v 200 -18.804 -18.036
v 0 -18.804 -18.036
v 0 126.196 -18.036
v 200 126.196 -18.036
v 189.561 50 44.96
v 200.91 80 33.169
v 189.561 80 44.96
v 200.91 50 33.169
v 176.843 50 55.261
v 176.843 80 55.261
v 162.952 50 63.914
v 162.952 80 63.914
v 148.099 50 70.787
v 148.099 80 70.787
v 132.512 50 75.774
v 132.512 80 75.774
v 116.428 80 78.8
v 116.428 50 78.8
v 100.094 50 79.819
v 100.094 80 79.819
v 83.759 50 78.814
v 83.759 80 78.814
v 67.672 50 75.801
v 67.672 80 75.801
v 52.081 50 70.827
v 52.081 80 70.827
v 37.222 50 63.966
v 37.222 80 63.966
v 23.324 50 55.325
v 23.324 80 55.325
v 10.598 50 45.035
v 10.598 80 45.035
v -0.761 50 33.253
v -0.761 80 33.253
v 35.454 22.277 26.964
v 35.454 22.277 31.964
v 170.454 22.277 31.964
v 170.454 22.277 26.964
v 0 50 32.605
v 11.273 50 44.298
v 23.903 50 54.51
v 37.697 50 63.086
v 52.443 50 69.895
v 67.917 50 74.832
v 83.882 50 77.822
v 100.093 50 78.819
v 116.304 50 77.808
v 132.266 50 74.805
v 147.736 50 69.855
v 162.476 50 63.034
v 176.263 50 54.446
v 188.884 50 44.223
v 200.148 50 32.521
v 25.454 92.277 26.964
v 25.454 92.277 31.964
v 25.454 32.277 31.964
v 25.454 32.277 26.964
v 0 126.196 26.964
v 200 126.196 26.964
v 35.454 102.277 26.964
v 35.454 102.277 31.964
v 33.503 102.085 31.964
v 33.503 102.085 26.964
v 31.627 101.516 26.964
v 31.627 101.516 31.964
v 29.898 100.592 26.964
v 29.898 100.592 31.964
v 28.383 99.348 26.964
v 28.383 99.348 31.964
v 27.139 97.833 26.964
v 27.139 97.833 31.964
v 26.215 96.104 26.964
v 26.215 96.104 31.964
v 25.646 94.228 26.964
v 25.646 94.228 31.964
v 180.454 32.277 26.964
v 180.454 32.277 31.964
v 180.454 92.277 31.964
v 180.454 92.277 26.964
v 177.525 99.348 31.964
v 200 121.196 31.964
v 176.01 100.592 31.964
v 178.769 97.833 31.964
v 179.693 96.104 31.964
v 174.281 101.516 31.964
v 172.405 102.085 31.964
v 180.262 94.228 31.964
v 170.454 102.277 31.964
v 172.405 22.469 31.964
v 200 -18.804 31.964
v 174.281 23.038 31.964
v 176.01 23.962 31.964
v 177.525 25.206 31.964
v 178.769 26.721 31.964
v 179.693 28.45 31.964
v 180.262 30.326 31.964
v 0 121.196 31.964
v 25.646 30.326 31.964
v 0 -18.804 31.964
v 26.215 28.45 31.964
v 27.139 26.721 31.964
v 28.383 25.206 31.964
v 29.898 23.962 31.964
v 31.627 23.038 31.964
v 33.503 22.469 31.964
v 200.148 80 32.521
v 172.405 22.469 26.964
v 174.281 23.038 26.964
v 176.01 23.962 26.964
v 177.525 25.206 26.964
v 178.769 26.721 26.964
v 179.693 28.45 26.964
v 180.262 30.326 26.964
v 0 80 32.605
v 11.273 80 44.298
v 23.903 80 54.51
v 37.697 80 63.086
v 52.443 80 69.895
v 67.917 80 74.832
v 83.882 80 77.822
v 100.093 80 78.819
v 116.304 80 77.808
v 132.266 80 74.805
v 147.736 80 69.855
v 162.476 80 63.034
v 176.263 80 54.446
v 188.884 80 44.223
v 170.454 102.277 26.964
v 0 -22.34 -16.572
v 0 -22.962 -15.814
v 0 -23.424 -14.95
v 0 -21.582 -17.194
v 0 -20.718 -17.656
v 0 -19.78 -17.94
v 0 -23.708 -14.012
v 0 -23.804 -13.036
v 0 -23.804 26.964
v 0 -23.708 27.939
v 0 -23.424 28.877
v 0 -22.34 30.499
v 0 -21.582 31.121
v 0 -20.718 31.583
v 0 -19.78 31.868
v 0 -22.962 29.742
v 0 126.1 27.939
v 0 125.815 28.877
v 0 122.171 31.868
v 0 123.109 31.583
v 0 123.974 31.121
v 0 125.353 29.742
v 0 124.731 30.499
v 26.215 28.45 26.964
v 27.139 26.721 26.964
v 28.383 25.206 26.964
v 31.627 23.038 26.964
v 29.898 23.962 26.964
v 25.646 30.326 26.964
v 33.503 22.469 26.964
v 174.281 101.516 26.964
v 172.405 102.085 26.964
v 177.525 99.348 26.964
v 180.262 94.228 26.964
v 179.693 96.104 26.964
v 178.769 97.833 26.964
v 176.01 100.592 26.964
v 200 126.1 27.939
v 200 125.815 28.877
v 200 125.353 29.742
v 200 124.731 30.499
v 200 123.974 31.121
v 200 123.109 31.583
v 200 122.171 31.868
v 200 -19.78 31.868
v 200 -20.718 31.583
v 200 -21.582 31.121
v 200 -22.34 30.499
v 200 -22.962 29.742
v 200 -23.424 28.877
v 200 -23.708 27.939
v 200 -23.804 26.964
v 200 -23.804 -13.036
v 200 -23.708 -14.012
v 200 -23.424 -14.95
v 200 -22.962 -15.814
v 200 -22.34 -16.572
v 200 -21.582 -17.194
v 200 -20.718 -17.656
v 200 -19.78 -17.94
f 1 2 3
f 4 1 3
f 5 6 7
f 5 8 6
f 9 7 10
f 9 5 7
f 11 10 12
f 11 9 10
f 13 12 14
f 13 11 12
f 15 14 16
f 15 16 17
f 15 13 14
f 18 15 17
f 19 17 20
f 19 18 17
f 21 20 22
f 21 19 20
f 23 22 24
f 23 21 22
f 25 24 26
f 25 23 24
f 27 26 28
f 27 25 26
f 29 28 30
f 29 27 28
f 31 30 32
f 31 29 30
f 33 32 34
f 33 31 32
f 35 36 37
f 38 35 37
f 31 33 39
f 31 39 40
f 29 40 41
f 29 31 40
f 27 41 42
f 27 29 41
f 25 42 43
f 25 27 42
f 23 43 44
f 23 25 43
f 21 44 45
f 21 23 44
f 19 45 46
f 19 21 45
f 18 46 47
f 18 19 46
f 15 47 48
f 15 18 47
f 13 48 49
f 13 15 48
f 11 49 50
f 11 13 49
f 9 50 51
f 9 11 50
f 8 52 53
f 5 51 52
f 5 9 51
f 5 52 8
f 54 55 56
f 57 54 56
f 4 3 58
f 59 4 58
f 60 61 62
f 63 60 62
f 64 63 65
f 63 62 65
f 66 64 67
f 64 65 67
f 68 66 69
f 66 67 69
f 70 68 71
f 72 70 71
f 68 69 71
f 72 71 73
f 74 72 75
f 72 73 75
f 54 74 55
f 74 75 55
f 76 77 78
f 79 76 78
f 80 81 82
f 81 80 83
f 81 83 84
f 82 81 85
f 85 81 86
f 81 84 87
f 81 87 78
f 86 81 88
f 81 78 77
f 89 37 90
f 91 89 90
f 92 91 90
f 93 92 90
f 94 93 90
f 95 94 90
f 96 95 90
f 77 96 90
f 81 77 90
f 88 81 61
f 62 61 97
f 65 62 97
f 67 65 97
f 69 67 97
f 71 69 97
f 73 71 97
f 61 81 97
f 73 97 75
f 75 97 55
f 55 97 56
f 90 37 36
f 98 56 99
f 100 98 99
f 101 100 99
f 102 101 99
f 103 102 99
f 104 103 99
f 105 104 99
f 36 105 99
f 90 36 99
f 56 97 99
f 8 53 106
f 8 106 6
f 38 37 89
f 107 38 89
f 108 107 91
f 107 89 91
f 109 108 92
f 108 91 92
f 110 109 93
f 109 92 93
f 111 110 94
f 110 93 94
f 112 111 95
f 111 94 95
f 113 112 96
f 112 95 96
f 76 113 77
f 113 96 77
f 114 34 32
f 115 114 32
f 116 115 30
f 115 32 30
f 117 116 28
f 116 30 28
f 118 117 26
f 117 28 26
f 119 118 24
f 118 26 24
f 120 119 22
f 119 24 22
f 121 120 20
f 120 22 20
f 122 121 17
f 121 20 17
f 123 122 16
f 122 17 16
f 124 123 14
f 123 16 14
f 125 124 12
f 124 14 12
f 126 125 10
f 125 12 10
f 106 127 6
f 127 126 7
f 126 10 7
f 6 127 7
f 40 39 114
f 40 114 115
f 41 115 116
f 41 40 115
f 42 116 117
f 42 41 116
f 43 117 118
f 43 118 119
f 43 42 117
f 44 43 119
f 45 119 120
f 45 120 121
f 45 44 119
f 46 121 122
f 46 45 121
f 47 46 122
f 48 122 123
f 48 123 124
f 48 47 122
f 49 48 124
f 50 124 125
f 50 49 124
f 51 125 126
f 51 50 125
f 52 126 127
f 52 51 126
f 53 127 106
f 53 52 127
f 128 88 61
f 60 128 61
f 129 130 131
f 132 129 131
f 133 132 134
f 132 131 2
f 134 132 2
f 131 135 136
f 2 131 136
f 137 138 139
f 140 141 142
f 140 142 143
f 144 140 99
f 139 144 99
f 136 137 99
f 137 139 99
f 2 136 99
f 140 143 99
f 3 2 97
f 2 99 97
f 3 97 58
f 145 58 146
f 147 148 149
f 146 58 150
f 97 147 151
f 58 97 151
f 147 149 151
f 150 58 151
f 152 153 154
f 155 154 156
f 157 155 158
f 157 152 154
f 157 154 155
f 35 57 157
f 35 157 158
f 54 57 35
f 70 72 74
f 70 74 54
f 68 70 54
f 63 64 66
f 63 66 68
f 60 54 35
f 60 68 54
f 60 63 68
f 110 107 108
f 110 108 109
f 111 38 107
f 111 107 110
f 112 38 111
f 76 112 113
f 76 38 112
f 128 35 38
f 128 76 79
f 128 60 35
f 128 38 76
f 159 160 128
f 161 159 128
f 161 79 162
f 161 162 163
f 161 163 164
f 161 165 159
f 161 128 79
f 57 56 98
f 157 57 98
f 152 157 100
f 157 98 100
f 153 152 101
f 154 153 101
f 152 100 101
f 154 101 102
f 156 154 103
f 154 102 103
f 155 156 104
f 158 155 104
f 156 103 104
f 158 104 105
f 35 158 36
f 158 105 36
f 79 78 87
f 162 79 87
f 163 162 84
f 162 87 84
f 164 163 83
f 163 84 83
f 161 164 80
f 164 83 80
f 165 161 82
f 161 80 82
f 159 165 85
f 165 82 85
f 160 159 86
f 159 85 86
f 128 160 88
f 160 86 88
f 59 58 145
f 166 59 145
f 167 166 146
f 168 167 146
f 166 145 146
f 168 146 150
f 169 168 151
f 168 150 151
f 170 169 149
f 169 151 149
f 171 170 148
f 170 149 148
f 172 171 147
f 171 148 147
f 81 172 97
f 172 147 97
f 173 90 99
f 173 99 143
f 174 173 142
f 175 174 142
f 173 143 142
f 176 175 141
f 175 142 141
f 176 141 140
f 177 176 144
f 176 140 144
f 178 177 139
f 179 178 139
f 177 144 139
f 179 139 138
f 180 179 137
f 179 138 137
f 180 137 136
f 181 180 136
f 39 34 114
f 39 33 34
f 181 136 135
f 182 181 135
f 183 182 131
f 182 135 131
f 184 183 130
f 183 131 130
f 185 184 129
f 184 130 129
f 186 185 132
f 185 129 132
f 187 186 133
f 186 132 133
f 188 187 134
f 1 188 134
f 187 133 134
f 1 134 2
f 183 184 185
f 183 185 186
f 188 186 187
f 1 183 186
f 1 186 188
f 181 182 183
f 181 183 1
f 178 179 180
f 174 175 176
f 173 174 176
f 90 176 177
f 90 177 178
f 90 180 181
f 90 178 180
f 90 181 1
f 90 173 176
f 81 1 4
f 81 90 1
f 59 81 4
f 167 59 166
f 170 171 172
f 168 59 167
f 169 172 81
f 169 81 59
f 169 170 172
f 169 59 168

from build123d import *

# Parameters (mm, degrees)
F1_DEPTH = 200
F3_DEPTH = 5
F6_DEPTH = 15


with BuildPart() as f1:
    # F0 (on Right) → F1 (new body)
    with BuildSketch(Plane.YZ):
        with BuildLine():
            ThreePointArc((-23.8041541259, -13.0362552404), (-22.3396880318, -16.5717891464), (-18.8041541259, -18.0362552404))
            Line((-18.8041541259, -18.0362552404), (126.1958458741, -18.0362552404))
            Line((126.1958458741, -18.0362552404), (126.1958458741, 26.9637447596))
            ThreePointArc((126.1958458741, 26.9637447596), (124.7313797801, 30.4992786655), (121.1958458741, 31.9637447596))
            Line((121.1958458741, 31.9637447596), (-18.8041541259, 31.9637447596))
            ThreePointArc((-18.8041541259, 31.9637447596), (-22.3396880318, 30.4992786655), (-23.8041541259, 26.9637447596))
            Line((-23.8041541259, 26.9637447596), (-23.8041541259, -13.0362552404))
        make_face()
    extrude(amount=F1_DEPTH)

    # F2 (on face) → F3 (cut)
    with BuildSketch(Plane.XY.offset(31.9637447596)):
        with BuildLine():
            ThreePointArc((25.4539602995, 32.2771672672), (28.3828924876, 25.2060994554), (35.4539602995, 22.2771672672))
            Line((35.4539602995, 22.2771672672), (170.4539602995, 22.2771672672))
            ThreePointArc((170.4539602995, 22.2771672672), (177.5250281114, 25.2060994554), (180.4539602995, 32.2771672672))
            Line((180.4539602995, 32.2771672672), (180.4539602995, 92.2771672672))
            ThreePointArc((180.4539602995, 92.2771672672), (177.5250281114, 99.3482350791), (170.4539602995, 102.2771672672))
            Line((170.4539602995, 102.2771672672), (35.4539602995, 102.2771672672))
            ThreePointArc((35.4539602995, 102.2771672672), (28.3828924876, 99.3482350791), (25.4539602995, 92.2771672672))
            Line((25.4539602995, 92.2771672672), (25.4539602995, 32.2771672672))
        make_face()
    extrude(amount=-F3_DEPTH, mode=Mode.SUBTRACT)


with BuildPart() as f6:
    # F5 (on offset) → F6 (new body, symmetric)
    with BuildSketch(Plane.XZ.offset(-65)):
        with BuildLine():
            Line((-0.7614290583, 33.2530171188), (0, 32.6047688723))
            ThreePointArc((0, 32.6047688723), (100.0932679903, 78.8187204886), (200.1478447514, 32.5210608269))
            Line((200.1478447514, 32.5210608269), (200.9098157783, 33.1686719403))
            ThreePointArc((200.9098157783, 33.1686719403), (100.0936862213, 79.8187204011), (-0.7614290583, 33.2530171188))
        make_face()
    extrude(amount=F6_DEPTH, both=True)


solid = Compound([f1.part, f6.part])
